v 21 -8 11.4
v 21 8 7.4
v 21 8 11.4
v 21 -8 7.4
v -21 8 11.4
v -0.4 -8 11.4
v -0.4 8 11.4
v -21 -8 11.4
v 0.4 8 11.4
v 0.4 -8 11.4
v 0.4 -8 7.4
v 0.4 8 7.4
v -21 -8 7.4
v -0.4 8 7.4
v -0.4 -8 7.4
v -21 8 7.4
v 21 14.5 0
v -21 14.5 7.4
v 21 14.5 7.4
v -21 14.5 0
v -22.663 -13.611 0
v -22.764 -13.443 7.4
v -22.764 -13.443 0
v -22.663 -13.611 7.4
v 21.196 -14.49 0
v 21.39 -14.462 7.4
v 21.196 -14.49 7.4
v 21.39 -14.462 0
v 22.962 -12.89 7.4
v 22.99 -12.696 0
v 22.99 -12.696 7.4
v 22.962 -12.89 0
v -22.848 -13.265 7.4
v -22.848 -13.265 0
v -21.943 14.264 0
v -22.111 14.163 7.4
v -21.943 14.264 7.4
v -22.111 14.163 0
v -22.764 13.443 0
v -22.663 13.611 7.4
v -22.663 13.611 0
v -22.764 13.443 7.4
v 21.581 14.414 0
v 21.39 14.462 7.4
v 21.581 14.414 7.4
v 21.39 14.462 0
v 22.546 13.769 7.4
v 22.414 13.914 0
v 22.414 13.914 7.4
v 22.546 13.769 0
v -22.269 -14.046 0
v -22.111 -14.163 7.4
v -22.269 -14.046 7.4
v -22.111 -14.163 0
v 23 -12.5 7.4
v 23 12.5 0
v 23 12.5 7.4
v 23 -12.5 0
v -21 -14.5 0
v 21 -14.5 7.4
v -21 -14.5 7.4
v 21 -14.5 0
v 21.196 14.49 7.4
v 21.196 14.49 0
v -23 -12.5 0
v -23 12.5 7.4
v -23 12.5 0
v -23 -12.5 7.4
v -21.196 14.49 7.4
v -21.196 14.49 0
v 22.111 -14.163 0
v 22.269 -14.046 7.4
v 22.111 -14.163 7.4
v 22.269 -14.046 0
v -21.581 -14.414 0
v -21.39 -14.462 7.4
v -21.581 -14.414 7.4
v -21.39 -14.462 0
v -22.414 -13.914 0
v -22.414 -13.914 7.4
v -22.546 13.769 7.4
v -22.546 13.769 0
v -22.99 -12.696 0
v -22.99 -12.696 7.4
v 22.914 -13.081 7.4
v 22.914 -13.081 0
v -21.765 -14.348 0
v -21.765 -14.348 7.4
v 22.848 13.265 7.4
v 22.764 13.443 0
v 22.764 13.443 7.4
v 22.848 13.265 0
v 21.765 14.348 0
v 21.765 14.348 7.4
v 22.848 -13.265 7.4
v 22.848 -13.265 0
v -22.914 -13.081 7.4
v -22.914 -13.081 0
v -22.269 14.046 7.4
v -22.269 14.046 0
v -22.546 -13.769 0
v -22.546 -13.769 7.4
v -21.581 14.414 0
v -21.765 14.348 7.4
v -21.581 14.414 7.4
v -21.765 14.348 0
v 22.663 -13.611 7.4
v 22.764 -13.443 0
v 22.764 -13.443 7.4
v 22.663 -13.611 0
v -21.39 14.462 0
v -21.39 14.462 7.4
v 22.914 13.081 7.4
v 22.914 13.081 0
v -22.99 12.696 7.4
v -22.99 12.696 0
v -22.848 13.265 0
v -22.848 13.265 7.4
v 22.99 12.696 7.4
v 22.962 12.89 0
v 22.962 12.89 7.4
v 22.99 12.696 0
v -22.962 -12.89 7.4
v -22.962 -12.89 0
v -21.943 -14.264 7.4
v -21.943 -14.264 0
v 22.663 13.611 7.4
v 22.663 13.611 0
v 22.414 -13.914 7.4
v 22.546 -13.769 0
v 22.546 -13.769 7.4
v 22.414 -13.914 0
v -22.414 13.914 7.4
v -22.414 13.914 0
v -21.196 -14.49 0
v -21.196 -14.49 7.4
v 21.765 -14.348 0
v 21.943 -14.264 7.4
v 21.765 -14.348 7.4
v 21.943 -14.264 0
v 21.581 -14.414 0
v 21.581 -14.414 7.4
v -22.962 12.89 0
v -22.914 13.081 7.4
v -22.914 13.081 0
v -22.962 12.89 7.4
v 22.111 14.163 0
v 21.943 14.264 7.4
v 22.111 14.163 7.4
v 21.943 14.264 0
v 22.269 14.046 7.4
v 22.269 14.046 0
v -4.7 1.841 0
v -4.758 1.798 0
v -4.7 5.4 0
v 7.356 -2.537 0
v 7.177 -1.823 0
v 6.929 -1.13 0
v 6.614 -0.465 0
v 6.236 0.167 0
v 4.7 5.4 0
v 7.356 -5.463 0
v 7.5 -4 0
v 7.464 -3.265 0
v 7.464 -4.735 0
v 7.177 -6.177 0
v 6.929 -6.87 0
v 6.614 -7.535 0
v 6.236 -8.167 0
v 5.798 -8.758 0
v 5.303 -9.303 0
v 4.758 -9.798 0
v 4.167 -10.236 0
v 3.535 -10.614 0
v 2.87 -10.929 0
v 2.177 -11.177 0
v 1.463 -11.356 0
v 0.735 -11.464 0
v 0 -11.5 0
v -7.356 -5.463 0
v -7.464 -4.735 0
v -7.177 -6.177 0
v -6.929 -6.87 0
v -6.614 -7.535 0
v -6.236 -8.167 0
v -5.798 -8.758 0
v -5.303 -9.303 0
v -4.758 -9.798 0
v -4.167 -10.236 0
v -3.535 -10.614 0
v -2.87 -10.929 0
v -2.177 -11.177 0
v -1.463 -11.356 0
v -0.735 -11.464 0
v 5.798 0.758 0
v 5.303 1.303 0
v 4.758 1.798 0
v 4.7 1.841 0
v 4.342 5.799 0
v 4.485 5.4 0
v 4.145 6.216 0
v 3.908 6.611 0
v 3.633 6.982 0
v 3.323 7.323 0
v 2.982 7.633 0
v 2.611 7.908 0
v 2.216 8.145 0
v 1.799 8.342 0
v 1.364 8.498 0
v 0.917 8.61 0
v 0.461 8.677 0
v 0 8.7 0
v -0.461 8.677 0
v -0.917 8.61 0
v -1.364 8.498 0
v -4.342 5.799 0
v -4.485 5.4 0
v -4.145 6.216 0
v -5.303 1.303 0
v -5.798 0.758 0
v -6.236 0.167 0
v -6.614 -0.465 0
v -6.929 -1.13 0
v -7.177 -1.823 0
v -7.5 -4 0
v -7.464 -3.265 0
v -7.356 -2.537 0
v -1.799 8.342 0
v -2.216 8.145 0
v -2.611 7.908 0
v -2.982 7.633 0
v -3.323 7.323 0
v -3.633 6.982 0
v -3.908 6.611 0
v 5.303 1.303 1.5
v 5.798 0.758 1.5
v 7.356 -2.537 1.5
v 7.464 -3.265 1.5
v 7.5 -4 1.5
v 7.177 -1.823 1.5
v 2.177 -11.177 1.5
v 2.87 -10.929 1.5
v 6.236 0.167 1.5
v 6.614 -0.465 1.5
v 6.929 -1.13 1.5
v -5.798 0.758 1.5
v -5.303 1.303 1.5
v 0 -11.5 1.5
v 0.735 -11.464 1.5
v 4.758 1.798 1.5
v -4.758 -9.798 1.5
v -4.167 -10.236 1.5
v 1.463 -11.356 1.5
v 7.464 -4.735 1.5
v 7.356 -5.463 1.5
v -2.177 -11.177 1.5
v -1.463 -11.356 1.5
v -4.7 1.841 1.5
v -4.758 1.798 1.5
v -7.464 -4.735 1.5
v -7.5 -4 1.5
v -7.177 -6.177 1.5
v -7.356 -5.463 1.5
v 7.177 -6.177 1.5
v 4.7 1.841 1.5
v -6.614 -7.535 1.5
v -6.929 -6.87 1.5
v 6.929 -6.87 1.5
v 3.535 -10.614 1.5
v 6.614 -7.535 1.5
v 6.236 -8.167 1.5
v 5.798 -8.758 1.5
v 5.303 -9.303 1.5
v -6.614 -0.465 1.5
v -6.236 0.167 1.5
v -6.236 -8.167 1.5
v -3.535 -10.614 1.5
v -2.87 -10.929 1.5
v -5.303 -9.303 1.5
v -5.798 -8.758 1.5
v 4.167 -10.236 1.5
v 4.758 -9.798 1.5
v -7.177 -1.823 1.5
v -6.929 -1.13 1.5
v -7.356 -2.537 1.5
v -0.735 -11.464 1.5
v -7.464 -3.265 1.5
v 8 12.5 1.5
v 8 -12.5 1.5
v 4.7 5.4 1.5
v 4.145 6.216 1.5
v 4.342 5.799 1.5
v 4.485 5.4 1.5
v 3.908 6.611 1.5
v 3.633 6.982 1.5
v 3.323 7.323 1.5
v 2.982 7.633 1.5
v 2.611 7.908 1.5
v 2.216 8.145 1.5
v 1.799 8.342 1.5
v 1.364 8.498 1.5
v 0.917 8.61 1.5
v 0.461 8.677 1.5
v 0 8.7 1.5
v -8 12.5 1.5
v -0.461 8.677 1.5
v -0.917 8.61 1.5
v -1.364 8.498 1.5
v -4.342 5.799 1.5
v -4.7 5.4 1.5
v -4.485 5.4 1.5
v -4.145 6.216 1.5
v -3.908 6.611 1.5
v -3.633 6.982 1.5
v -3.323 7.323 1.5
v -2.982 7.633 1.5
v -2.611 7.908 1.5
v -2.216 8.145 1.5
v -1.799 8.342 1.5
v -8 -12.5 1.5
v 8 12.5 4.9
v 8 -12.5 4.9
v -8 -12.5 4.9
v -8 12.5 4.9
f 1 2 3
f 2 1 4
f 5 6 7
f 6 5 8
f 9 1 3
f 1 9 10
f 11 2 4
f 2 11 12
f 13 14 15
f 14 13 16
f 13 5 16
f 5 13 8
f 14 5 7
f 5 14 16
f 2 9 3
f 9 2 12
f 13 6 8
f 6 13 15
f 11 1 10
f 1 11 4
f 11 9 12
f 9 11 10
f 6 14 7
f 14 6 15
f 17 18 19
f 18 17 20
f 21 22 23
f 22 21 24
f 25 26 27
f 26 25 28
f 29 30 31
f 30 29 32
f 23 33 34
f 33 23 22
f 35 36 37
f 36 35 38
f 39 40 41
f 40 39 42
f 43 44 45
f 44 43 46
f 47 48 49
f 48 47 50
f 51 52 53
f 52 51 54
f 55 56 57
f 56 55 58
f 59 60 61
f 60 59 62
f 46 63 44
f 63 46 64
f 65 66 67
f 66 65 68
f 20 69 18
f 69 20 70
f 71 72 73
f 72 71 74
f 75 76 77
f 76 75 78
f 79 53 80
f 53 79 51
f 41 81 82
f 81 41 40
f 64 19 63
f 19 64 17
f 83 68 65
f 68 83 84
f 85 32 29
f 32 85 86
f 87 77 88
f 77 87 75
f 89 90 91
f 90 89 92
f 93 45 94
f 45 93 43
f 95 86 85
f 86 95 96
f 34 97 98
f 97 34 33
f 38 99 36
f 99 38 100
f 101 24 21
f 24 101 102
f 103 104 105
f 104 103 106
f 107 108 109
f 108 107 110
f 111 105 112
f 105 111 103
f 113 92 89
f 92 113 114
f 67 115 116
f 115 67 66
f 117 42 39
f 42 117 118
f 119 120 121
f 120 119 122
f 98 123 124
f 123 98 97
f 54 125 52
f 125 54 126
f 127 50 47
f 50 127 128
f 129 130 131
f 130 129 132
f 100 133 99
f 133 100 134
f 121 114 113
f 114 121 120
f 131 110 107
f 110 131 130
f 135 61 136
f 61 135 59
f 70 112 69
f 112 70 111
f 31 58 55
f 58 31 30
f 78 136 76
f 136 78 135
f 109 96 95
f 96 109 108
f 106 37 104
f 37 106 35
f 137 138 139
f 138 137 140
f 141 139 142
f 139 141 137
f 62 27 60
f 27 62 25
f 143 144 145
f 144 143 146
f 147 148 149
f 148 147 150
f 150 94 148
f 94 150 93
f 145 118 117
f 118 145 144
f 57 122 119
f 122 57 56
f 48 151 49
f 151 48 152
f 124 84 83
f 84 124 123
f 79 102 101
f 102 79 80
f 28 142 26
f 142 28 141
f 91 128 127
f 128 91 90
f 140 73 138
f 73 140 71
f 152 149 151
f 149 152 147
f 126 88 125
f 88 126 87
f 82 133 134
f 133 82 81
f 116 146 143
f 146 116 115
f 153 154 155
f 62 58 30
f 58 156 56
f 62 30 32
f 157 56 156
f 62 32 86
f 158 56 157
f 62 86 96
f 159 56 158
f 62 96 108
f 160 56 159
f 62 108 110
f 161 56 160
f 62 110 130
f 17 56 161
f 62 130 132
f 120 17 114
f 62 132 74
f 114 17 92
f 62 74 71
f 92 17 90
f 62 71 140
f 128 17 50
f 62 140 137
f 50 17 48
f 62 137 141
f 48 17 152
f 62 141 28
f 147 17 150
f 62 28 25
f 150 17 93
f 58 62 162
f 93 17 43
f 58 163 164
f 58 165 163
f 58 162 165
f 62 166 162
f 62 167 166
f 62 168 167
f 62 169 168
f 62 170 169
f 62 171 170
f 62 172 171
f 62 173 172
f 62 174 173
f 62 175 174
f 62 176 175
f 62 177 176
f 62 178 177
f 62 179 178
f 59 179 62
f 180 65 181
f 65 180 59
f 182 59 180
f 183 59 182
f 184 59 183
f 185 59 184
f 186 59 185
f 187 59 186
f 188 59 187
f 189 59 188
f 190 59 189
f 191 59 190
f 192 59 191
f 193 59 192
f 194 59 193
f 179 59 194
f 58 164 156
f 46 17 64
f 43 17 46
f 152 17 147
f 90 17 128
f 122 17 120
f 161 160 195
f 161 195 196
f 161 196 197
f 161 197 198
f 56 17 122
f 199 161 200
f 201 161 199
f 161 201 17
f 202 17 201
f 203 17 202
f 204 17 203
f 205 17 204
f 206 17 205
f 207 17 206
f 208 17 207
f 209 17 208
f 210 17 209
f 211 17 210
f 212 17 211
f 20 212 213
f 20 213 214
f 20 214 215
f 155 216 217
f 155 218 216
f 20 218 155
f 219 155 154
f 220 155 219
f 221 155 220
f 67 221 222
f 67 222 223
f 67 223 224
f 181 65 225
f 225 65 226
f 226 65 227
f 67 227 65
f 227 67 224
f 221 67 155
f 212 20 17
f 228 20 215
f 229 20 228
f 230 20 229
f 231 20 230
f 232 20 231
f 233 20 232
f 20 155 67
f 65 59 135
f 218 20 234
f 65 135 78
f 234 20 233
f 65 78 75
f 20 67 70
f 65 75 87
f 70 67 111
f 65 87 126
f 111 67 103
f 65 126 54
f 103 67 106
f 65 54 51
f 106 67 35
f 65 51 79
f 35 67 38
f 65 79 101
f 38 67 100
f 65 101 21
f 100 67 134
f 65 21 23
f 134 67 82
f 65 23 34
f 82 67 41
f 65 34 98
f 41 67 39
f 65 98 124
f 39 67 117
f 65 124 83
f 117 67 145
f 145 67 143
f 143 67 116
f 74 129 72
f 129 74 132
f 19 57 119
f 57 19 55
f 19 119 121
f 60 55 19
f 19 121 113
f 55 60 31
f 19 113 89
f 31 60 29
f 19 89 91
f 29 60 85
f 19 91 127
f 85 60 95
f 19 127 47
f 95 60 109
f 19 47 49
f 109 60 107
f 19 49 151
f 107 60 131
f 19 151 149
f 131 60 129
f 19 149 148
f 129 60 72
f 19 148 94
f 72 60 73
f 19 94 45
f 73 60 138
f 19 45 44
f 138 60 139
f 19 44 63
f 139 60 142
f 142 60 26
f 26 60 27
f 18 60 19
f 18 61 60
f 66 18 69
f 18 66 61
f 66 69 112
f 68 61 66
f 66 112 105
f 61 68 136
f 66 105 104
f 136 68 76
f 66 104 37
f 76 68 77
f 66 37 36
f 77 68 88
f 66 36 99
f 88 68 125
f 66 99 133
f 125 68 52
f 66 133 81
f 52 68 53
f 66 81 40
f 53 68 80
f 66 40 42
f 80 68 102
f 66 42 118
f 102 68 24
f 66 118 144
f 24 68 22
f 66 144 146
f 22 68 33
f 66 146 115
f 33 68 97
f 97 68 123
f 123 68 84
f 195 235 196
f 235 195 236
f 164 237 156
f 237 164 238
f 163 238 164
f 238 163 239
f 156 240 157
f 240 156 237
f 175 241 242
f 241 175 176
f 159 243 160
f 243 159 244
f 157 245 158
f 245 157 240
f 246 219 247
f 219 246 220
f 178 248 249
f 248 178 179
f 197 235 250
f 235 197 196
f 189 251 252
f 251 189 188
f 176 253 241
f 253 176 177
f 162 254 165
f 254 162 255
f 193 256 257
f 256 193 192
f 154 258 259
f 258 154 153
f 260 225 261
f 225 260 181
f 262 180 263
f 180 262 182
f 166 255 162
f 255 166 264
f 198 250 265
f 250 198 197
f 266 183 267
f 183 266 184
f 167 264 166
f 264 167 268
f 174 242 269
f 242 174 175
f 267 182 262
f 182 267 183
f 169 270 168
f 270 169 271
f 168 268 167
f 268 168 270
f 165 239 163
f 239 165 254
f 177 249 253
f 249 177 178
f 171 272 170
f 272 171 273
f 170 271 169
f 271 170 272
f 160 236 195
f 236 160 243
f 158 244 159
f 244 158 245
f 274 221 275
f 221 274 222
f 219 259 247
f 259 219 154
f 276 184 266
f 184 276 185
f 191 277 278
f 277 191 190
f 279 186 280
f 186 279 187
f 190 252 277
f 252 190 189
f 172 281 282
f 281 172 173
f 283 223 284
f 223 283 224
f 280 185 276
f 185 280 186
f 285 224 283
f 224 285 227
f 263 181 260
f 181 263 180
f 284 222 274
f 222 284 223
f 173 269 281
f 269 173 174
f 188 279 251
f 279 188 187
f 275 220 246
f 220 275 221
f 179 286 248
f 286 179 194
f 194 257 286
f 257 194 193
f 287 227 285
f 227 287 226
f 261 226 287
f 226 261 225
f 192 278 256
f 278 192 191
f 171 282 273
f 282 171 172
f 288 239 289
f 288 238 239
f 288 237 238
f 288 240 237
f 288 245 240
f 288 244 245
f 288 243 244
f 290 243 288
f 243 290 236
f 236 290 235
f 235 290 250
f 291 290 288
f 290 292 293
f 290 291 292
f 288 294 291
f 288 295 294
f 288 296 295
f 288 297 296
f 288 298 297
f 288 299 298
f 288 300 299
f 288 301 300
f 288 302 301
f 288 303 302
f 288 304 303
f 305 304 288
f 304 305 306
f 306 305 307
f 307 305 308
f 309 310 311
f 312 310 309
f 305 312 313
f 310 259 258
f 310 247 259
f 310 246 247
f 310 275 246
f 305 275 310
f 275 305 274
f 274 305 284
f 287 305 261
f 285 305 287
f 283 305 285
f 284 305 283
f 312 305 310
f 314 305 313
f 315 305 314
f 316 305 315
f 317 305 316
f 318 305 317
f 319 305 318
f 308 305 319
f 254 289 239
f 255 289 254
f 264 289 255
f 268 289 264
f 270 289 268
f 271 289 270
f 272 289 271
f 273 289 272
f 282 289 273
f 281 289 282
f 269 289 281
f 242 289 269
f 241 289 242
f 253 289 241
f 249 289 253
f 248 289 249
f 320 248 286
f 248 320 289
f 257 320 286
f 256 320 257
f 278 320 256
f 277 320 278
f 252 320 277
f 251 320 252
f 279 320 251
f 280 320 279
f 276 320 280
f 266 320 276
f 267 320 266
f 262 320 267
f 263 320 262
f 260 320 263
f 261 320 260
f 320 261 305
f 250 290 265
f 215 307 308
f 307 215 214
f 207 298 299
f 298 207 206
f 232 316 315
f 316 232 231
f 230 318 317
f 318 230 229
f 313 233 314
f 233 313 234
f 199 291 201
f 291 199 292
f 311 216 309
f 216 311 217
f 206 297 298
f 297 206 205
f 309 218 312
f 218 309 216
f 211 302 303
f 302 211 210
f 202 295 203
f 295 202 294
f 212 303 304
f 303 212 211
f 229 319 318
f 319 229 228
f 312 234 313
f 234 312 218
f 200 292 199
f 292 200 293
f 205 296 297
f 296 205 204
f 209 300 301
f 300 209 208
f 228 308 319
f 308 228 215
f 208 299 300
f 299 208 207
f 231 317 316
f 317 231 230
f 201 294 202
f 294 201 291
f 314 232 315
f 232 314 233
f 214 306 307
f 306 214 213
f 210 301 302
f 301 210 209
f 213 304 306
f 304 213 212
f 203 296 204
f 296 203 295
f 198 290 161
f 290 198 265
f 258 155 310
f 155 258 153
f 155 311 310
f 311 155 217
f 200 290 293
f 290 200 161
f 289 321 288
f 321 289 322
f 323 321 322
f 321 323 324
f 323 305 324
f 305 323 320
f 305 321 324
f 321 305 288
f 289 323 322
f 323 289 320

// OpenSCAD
$fn=64;

difference() {
  union() {
    minkowski() {
      translate([0, 0, 5.4/2]) cube([46-4, 25, 5.4], center=true);
      cylinder(h=2, r=2);
    }
    translate([0, 0, 9.4]) difference() {
      cube([42, 16, 4], center=true);
      cube([0.8, 16, 4], center=true);
    }
  }
  union() {
    translate([0, -4, 0]) cylinder(h=1.5, d=15);
    translate([0, 4, 0]) cylinder(h=1.5, d=9.4);
    translate([0, 9.4/2-4, 0.75]) cube([9.4, 9.4, 1.5], center=true);
    translate([0, 0, 3.4/2+1.5]) cube([16, 25, 3.4], center=true);    
//    translate([0, 0, 7]) cube([20, 29, 10], center=true);
  }
}

//color([1, 0, 0]) translate([0, -4, 2]) cylinder(h=3.4, d=15);
//color([1, 1, 0]) translate([0, 4, 2]) cylinder(h=3.4, d=15);
